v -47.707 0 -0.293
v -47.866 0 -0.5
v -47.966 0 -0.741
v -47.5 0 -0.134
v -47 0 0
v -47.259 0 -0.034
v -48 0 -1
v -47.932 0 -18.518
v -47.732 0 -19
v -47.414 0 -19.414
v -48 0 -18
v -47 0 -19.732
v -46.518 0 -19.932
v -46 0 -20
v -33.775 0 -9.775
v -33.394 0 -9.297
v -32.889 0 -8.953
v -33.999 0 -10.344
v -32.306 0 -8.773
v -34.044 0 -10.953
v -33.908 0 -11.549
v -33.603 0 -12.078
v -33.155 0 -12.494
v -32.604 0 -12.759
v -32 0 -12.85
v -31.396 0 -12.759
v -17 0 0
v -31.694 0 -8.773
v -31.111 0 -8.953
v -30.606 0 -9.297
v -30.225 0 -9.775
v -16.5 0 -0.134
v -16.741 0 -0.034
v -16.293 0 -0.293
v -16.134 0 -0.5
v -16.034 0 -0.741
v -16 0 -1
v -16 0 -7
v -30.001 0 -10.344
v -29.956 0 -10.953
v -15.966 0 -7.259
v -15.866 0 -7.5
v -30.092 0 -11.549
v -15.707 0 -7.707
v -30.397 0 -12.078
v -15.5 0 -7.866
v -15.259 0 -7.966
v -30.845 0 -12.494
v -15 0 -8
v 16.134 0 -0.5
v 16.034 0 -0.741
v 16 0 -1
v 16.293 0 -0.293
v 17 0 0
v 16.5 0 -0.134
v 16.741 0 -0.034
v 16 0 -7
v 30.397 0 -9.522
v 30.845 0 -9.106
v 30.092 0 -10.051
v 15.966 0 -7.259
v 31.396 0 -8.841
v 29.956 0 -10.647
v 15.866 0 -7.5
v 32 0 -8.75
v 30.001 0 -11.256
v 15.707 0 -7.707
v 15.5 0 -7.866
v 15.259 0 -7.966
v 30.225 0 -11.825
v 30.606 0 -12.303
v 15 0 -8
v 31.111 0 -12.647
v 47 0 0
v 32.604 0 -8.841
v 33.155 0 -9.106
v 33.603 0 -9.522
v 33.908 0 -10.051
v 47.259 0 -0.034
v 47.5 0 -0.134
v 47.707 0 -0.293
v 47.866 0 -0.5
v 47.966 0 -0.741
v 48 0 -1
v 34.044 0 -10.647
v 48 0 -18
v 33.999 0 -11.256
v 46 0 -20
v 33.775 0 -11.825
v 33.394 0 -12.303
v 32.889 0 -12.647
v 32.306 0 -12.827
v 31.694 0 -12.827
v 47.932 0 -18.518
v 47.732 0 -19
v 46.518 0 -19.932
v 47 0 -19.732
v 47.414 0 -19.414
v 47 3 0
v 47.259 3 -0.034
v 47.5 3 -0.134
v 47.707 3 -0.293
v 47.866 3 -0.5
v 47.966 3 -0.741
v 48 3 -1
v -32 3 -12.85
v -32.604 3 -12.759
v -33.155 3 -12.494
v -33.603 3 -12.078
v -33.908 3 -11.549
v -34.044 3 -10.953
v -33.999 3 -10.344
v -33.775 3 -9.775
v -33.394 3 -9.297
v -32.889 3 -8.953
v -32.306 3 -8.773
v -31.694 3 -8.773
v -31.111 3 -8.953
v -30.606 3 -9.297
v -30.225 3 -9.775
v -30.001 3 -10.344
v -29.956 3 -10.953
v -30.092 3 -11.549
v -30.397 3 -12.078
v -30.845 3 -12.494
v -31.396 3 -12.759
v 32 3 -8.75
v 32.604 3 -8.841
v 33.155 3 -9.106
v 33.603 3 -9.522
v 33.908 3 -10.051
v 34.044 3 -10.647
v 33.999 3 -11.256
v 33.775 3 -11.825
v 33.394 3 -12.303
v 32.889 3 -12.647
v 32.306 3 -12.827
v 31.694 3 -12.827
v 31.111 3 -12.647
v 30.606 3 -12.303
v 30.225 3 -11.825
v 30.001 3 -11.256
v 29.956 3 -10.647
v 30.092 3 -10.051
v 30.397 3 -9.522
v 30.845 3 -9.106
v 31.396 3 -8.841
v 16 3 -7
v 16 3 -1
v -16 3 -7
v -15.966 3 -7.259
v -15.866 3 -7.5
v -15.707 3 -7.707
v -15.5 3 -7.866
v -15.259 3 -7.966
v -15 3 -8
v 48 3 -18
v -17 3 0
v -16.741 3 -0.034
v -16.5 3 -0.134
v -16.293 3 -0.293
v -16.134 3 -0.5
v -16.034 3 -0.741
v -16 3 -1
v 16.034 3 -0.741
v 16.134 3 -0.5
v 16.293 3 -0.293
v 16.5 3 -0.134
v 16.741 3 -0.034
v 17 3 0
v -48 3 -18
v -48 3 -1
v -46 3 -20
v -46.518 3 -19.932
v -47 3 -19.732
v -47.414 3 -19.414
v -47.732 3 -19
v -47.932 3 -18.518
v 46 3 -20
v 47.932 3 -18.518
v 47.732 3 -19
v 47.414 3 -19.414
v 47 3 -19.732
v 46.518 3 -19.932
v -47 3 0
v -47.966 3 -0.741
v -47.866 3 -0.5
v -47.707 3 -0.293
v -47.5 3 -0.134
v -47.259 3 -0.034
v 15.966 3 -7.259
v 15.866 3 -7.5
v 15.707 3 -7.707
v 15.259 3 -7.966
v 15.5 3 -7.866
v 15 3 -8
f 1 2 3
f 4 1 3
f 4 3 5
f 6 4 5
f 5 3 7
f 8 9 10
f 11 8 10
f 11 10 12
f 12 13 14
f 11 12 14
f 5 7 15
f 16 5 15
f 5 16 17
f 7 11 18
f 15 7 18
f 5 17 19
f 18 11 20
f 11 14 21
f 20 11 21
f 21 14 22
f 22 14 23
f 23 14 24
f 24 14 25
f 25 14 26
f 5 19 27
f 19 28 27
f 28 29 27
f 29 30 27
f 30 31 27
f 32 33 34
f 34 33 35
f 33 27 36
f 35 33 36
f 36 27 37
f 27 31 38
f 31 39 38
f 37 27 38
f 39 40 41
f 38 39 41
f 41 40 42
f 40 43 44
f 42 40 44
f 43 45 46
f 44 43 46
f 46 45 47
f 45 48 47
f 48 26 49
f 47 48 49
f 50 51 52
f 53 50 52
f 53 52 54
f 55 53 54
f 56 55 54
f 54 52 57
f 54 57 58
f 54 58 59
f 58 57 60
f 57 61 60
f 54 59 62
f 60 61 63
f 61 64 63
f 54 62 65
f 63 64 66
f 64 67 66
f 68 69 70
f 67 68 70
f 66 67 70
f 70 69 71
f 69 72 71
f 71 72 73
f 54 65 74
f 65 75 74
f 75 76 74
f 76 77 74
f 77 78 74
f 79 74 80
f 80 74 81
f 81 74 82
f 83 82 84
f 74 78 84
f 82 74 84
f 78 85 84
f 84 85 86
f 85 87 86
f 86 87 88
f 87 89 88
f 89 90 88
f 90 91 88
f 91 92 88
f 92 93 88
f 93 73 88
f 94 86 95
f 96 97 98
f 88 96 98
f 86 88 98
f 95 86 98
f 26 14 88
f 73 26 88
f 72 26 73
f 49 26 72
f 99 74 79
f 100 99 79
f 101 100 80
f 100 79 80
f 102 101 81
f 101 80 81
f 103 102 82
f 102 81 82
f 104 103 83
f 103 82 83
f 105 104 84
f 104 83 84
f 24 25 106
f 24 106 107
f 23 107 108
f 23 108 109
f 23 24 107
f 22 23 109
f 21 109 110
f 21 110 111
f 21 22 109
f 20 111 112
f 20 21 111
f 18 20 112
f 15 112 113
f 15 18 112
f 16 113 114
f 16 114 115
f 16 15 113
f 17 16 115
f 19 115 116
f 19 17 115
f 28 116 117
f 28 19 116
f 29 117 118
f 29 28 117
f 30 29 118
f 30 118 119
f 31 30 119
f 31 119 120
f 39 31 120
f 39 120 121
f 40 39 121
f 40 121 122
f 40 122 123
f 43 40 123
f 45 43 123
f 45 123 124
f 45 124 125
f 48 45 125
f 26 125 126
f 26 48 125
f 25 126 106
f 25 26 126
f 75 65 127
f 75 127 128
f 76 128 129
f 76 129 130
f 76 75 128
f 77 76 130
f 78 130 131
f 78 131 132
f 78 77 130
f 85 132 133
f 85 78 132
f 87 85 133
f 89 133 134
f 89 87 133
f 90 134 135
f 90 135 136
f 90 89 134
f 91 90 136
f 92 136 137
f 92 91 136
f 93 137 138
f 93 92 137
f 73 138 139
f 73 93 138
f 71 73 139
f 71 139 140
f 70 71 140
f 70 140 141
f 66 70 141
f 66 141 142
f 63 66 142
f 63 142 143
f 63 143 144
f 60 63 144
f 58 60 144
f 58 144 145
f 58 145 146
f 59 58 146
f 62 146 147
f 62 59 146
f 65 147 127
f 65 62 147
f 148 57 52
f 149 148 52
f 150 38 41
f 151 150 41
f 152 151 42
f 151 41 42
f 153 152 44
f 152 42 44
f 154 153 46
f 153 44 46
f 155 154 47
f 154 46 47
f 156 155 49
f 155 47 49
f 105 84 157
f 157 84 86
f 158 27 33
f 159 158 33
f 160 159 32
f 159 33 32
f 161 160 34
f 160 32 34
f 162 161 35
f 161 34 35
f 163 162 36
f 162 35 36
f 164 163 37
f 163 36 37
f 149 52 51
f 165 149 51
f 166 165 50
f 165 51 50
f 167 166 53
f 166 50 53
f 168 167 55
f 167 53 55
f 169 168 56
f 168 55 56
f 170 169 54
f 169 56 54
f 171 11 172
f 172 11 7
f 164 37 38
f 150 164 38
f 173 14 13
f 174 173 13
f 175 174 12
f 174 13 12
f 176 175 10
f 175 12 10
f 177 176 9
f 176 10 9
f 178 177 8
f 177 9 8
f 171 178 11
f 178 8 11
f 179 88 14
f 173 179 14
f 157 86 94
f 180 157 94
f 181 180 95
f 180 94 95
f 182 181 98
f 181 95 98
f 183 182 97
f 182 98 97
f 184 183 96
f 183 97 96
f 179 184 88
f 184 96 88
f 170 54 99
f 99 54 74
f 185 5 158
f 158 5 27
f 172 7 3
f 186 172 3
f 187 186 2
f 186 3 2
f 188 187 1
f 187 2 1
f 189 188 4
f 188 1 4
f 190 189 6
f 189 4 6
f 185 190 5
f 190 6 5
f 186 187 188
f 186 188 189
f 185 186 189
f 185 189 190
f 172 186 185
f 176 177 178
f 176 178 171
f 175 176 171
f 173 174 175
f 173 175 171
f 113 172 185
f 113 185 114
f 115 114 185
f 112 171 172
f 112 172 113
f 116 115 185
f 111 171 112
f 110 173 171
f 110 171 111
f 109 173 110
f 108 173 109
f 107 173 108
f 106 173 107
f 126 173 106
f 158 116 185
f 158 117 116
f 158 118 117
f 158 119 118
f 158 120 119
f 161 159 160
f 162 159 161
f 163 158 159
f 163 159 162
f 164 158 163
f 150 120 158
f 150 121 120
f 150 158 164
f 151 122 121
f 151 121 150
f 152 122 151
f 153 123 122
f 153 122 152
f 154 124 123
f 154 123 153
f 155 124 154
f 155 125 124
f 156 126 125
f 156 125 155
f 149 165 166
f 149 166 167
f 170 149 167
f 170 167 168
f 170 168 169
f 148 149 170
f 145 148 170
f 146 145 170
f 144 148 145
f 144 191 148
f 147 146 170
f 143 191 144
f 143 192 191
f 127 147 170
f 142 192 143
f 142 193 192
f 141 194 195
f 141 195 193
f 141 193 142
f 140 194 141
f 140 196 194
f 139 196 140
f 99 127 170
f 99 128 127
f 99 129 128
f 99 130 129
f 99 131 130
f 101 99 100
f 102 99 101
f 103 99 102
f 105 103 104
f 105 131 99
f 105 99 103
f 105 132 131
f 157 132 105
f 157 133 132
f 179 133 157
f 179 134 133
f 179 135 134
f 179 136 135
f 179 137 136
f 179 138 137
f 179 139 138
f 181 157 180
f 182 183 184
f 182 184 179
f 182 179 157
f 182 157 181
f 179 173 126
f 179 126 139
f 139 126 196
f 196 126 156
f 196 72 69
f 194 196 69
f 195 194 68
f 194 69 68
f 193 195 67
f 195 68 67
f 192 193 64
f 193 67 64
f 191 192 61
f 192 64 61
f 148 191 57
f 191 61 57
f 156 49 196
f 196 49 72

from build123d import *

# Parameters (mm, degrees)
SKETCH1_R           = 2.05
BOSS_EXTRUDE1_DEPTH = 3


with BuildPart() as part:
    # Sketch1 → Boss-Extrude1 (new body)
    with BuildSketch(Plane(origin=(0, 0, 0), x_dir=(1, 0, 0), z_dir=(0, 1, 0))):
        with BuildLine():
            Line((46, 20), (-46, 20))
            ThreePointArc((-46, 20), (-47.414213562, 19.414213562), (-48, 18))
            Line((-48, 18), (-48, 1))
            ThreePointArc((-48, 1), (-47.707106781, 0.292893219), (-47, 0))
            Line((-47, 0), (-17, 0))
            ThreePointArc((-17, 0), (-16.292893219, 0.292893219), (-16, 1))
            Line((-16, 1), (-16, 7))
            ThreePointArc((-16, 7), (-15.707106781, 7.707106781), (-15, 8))
            Line((-15, 8), (15, 8))
            ThreePointArc((15, 8), (15.707106781, 7.707106781), (16, 7))
            Line((16, 7), (16, 1))
            ThreePointArc((16, 1), (16.292893219, 0.292893219), (17, 0))
            Line((17, 0), (47, 0))
            ThreePointArc((47, 0), (47.707106781, 0.292893219), (48, 1))
            Line((48, 1), (48, 18))
            ThreePointArc((48, 18), (47.414213562, 19.414213562), (46, 20))
        make_face()
        with Locations(Location((32, 10.8, 0), (0, 0, 270))):
            Circle(SKETCH1_R, mode=Mode.SUBTRACT)
        with Locations(Location((-32, 10.8, 0), (0, 0, 90))):
            Circle(SKETCH1_R, mode=Mode.SUBTRACT)
    extrude(amount=BOSS_EXTRUDE1_DEPTH)


solid = part.part
